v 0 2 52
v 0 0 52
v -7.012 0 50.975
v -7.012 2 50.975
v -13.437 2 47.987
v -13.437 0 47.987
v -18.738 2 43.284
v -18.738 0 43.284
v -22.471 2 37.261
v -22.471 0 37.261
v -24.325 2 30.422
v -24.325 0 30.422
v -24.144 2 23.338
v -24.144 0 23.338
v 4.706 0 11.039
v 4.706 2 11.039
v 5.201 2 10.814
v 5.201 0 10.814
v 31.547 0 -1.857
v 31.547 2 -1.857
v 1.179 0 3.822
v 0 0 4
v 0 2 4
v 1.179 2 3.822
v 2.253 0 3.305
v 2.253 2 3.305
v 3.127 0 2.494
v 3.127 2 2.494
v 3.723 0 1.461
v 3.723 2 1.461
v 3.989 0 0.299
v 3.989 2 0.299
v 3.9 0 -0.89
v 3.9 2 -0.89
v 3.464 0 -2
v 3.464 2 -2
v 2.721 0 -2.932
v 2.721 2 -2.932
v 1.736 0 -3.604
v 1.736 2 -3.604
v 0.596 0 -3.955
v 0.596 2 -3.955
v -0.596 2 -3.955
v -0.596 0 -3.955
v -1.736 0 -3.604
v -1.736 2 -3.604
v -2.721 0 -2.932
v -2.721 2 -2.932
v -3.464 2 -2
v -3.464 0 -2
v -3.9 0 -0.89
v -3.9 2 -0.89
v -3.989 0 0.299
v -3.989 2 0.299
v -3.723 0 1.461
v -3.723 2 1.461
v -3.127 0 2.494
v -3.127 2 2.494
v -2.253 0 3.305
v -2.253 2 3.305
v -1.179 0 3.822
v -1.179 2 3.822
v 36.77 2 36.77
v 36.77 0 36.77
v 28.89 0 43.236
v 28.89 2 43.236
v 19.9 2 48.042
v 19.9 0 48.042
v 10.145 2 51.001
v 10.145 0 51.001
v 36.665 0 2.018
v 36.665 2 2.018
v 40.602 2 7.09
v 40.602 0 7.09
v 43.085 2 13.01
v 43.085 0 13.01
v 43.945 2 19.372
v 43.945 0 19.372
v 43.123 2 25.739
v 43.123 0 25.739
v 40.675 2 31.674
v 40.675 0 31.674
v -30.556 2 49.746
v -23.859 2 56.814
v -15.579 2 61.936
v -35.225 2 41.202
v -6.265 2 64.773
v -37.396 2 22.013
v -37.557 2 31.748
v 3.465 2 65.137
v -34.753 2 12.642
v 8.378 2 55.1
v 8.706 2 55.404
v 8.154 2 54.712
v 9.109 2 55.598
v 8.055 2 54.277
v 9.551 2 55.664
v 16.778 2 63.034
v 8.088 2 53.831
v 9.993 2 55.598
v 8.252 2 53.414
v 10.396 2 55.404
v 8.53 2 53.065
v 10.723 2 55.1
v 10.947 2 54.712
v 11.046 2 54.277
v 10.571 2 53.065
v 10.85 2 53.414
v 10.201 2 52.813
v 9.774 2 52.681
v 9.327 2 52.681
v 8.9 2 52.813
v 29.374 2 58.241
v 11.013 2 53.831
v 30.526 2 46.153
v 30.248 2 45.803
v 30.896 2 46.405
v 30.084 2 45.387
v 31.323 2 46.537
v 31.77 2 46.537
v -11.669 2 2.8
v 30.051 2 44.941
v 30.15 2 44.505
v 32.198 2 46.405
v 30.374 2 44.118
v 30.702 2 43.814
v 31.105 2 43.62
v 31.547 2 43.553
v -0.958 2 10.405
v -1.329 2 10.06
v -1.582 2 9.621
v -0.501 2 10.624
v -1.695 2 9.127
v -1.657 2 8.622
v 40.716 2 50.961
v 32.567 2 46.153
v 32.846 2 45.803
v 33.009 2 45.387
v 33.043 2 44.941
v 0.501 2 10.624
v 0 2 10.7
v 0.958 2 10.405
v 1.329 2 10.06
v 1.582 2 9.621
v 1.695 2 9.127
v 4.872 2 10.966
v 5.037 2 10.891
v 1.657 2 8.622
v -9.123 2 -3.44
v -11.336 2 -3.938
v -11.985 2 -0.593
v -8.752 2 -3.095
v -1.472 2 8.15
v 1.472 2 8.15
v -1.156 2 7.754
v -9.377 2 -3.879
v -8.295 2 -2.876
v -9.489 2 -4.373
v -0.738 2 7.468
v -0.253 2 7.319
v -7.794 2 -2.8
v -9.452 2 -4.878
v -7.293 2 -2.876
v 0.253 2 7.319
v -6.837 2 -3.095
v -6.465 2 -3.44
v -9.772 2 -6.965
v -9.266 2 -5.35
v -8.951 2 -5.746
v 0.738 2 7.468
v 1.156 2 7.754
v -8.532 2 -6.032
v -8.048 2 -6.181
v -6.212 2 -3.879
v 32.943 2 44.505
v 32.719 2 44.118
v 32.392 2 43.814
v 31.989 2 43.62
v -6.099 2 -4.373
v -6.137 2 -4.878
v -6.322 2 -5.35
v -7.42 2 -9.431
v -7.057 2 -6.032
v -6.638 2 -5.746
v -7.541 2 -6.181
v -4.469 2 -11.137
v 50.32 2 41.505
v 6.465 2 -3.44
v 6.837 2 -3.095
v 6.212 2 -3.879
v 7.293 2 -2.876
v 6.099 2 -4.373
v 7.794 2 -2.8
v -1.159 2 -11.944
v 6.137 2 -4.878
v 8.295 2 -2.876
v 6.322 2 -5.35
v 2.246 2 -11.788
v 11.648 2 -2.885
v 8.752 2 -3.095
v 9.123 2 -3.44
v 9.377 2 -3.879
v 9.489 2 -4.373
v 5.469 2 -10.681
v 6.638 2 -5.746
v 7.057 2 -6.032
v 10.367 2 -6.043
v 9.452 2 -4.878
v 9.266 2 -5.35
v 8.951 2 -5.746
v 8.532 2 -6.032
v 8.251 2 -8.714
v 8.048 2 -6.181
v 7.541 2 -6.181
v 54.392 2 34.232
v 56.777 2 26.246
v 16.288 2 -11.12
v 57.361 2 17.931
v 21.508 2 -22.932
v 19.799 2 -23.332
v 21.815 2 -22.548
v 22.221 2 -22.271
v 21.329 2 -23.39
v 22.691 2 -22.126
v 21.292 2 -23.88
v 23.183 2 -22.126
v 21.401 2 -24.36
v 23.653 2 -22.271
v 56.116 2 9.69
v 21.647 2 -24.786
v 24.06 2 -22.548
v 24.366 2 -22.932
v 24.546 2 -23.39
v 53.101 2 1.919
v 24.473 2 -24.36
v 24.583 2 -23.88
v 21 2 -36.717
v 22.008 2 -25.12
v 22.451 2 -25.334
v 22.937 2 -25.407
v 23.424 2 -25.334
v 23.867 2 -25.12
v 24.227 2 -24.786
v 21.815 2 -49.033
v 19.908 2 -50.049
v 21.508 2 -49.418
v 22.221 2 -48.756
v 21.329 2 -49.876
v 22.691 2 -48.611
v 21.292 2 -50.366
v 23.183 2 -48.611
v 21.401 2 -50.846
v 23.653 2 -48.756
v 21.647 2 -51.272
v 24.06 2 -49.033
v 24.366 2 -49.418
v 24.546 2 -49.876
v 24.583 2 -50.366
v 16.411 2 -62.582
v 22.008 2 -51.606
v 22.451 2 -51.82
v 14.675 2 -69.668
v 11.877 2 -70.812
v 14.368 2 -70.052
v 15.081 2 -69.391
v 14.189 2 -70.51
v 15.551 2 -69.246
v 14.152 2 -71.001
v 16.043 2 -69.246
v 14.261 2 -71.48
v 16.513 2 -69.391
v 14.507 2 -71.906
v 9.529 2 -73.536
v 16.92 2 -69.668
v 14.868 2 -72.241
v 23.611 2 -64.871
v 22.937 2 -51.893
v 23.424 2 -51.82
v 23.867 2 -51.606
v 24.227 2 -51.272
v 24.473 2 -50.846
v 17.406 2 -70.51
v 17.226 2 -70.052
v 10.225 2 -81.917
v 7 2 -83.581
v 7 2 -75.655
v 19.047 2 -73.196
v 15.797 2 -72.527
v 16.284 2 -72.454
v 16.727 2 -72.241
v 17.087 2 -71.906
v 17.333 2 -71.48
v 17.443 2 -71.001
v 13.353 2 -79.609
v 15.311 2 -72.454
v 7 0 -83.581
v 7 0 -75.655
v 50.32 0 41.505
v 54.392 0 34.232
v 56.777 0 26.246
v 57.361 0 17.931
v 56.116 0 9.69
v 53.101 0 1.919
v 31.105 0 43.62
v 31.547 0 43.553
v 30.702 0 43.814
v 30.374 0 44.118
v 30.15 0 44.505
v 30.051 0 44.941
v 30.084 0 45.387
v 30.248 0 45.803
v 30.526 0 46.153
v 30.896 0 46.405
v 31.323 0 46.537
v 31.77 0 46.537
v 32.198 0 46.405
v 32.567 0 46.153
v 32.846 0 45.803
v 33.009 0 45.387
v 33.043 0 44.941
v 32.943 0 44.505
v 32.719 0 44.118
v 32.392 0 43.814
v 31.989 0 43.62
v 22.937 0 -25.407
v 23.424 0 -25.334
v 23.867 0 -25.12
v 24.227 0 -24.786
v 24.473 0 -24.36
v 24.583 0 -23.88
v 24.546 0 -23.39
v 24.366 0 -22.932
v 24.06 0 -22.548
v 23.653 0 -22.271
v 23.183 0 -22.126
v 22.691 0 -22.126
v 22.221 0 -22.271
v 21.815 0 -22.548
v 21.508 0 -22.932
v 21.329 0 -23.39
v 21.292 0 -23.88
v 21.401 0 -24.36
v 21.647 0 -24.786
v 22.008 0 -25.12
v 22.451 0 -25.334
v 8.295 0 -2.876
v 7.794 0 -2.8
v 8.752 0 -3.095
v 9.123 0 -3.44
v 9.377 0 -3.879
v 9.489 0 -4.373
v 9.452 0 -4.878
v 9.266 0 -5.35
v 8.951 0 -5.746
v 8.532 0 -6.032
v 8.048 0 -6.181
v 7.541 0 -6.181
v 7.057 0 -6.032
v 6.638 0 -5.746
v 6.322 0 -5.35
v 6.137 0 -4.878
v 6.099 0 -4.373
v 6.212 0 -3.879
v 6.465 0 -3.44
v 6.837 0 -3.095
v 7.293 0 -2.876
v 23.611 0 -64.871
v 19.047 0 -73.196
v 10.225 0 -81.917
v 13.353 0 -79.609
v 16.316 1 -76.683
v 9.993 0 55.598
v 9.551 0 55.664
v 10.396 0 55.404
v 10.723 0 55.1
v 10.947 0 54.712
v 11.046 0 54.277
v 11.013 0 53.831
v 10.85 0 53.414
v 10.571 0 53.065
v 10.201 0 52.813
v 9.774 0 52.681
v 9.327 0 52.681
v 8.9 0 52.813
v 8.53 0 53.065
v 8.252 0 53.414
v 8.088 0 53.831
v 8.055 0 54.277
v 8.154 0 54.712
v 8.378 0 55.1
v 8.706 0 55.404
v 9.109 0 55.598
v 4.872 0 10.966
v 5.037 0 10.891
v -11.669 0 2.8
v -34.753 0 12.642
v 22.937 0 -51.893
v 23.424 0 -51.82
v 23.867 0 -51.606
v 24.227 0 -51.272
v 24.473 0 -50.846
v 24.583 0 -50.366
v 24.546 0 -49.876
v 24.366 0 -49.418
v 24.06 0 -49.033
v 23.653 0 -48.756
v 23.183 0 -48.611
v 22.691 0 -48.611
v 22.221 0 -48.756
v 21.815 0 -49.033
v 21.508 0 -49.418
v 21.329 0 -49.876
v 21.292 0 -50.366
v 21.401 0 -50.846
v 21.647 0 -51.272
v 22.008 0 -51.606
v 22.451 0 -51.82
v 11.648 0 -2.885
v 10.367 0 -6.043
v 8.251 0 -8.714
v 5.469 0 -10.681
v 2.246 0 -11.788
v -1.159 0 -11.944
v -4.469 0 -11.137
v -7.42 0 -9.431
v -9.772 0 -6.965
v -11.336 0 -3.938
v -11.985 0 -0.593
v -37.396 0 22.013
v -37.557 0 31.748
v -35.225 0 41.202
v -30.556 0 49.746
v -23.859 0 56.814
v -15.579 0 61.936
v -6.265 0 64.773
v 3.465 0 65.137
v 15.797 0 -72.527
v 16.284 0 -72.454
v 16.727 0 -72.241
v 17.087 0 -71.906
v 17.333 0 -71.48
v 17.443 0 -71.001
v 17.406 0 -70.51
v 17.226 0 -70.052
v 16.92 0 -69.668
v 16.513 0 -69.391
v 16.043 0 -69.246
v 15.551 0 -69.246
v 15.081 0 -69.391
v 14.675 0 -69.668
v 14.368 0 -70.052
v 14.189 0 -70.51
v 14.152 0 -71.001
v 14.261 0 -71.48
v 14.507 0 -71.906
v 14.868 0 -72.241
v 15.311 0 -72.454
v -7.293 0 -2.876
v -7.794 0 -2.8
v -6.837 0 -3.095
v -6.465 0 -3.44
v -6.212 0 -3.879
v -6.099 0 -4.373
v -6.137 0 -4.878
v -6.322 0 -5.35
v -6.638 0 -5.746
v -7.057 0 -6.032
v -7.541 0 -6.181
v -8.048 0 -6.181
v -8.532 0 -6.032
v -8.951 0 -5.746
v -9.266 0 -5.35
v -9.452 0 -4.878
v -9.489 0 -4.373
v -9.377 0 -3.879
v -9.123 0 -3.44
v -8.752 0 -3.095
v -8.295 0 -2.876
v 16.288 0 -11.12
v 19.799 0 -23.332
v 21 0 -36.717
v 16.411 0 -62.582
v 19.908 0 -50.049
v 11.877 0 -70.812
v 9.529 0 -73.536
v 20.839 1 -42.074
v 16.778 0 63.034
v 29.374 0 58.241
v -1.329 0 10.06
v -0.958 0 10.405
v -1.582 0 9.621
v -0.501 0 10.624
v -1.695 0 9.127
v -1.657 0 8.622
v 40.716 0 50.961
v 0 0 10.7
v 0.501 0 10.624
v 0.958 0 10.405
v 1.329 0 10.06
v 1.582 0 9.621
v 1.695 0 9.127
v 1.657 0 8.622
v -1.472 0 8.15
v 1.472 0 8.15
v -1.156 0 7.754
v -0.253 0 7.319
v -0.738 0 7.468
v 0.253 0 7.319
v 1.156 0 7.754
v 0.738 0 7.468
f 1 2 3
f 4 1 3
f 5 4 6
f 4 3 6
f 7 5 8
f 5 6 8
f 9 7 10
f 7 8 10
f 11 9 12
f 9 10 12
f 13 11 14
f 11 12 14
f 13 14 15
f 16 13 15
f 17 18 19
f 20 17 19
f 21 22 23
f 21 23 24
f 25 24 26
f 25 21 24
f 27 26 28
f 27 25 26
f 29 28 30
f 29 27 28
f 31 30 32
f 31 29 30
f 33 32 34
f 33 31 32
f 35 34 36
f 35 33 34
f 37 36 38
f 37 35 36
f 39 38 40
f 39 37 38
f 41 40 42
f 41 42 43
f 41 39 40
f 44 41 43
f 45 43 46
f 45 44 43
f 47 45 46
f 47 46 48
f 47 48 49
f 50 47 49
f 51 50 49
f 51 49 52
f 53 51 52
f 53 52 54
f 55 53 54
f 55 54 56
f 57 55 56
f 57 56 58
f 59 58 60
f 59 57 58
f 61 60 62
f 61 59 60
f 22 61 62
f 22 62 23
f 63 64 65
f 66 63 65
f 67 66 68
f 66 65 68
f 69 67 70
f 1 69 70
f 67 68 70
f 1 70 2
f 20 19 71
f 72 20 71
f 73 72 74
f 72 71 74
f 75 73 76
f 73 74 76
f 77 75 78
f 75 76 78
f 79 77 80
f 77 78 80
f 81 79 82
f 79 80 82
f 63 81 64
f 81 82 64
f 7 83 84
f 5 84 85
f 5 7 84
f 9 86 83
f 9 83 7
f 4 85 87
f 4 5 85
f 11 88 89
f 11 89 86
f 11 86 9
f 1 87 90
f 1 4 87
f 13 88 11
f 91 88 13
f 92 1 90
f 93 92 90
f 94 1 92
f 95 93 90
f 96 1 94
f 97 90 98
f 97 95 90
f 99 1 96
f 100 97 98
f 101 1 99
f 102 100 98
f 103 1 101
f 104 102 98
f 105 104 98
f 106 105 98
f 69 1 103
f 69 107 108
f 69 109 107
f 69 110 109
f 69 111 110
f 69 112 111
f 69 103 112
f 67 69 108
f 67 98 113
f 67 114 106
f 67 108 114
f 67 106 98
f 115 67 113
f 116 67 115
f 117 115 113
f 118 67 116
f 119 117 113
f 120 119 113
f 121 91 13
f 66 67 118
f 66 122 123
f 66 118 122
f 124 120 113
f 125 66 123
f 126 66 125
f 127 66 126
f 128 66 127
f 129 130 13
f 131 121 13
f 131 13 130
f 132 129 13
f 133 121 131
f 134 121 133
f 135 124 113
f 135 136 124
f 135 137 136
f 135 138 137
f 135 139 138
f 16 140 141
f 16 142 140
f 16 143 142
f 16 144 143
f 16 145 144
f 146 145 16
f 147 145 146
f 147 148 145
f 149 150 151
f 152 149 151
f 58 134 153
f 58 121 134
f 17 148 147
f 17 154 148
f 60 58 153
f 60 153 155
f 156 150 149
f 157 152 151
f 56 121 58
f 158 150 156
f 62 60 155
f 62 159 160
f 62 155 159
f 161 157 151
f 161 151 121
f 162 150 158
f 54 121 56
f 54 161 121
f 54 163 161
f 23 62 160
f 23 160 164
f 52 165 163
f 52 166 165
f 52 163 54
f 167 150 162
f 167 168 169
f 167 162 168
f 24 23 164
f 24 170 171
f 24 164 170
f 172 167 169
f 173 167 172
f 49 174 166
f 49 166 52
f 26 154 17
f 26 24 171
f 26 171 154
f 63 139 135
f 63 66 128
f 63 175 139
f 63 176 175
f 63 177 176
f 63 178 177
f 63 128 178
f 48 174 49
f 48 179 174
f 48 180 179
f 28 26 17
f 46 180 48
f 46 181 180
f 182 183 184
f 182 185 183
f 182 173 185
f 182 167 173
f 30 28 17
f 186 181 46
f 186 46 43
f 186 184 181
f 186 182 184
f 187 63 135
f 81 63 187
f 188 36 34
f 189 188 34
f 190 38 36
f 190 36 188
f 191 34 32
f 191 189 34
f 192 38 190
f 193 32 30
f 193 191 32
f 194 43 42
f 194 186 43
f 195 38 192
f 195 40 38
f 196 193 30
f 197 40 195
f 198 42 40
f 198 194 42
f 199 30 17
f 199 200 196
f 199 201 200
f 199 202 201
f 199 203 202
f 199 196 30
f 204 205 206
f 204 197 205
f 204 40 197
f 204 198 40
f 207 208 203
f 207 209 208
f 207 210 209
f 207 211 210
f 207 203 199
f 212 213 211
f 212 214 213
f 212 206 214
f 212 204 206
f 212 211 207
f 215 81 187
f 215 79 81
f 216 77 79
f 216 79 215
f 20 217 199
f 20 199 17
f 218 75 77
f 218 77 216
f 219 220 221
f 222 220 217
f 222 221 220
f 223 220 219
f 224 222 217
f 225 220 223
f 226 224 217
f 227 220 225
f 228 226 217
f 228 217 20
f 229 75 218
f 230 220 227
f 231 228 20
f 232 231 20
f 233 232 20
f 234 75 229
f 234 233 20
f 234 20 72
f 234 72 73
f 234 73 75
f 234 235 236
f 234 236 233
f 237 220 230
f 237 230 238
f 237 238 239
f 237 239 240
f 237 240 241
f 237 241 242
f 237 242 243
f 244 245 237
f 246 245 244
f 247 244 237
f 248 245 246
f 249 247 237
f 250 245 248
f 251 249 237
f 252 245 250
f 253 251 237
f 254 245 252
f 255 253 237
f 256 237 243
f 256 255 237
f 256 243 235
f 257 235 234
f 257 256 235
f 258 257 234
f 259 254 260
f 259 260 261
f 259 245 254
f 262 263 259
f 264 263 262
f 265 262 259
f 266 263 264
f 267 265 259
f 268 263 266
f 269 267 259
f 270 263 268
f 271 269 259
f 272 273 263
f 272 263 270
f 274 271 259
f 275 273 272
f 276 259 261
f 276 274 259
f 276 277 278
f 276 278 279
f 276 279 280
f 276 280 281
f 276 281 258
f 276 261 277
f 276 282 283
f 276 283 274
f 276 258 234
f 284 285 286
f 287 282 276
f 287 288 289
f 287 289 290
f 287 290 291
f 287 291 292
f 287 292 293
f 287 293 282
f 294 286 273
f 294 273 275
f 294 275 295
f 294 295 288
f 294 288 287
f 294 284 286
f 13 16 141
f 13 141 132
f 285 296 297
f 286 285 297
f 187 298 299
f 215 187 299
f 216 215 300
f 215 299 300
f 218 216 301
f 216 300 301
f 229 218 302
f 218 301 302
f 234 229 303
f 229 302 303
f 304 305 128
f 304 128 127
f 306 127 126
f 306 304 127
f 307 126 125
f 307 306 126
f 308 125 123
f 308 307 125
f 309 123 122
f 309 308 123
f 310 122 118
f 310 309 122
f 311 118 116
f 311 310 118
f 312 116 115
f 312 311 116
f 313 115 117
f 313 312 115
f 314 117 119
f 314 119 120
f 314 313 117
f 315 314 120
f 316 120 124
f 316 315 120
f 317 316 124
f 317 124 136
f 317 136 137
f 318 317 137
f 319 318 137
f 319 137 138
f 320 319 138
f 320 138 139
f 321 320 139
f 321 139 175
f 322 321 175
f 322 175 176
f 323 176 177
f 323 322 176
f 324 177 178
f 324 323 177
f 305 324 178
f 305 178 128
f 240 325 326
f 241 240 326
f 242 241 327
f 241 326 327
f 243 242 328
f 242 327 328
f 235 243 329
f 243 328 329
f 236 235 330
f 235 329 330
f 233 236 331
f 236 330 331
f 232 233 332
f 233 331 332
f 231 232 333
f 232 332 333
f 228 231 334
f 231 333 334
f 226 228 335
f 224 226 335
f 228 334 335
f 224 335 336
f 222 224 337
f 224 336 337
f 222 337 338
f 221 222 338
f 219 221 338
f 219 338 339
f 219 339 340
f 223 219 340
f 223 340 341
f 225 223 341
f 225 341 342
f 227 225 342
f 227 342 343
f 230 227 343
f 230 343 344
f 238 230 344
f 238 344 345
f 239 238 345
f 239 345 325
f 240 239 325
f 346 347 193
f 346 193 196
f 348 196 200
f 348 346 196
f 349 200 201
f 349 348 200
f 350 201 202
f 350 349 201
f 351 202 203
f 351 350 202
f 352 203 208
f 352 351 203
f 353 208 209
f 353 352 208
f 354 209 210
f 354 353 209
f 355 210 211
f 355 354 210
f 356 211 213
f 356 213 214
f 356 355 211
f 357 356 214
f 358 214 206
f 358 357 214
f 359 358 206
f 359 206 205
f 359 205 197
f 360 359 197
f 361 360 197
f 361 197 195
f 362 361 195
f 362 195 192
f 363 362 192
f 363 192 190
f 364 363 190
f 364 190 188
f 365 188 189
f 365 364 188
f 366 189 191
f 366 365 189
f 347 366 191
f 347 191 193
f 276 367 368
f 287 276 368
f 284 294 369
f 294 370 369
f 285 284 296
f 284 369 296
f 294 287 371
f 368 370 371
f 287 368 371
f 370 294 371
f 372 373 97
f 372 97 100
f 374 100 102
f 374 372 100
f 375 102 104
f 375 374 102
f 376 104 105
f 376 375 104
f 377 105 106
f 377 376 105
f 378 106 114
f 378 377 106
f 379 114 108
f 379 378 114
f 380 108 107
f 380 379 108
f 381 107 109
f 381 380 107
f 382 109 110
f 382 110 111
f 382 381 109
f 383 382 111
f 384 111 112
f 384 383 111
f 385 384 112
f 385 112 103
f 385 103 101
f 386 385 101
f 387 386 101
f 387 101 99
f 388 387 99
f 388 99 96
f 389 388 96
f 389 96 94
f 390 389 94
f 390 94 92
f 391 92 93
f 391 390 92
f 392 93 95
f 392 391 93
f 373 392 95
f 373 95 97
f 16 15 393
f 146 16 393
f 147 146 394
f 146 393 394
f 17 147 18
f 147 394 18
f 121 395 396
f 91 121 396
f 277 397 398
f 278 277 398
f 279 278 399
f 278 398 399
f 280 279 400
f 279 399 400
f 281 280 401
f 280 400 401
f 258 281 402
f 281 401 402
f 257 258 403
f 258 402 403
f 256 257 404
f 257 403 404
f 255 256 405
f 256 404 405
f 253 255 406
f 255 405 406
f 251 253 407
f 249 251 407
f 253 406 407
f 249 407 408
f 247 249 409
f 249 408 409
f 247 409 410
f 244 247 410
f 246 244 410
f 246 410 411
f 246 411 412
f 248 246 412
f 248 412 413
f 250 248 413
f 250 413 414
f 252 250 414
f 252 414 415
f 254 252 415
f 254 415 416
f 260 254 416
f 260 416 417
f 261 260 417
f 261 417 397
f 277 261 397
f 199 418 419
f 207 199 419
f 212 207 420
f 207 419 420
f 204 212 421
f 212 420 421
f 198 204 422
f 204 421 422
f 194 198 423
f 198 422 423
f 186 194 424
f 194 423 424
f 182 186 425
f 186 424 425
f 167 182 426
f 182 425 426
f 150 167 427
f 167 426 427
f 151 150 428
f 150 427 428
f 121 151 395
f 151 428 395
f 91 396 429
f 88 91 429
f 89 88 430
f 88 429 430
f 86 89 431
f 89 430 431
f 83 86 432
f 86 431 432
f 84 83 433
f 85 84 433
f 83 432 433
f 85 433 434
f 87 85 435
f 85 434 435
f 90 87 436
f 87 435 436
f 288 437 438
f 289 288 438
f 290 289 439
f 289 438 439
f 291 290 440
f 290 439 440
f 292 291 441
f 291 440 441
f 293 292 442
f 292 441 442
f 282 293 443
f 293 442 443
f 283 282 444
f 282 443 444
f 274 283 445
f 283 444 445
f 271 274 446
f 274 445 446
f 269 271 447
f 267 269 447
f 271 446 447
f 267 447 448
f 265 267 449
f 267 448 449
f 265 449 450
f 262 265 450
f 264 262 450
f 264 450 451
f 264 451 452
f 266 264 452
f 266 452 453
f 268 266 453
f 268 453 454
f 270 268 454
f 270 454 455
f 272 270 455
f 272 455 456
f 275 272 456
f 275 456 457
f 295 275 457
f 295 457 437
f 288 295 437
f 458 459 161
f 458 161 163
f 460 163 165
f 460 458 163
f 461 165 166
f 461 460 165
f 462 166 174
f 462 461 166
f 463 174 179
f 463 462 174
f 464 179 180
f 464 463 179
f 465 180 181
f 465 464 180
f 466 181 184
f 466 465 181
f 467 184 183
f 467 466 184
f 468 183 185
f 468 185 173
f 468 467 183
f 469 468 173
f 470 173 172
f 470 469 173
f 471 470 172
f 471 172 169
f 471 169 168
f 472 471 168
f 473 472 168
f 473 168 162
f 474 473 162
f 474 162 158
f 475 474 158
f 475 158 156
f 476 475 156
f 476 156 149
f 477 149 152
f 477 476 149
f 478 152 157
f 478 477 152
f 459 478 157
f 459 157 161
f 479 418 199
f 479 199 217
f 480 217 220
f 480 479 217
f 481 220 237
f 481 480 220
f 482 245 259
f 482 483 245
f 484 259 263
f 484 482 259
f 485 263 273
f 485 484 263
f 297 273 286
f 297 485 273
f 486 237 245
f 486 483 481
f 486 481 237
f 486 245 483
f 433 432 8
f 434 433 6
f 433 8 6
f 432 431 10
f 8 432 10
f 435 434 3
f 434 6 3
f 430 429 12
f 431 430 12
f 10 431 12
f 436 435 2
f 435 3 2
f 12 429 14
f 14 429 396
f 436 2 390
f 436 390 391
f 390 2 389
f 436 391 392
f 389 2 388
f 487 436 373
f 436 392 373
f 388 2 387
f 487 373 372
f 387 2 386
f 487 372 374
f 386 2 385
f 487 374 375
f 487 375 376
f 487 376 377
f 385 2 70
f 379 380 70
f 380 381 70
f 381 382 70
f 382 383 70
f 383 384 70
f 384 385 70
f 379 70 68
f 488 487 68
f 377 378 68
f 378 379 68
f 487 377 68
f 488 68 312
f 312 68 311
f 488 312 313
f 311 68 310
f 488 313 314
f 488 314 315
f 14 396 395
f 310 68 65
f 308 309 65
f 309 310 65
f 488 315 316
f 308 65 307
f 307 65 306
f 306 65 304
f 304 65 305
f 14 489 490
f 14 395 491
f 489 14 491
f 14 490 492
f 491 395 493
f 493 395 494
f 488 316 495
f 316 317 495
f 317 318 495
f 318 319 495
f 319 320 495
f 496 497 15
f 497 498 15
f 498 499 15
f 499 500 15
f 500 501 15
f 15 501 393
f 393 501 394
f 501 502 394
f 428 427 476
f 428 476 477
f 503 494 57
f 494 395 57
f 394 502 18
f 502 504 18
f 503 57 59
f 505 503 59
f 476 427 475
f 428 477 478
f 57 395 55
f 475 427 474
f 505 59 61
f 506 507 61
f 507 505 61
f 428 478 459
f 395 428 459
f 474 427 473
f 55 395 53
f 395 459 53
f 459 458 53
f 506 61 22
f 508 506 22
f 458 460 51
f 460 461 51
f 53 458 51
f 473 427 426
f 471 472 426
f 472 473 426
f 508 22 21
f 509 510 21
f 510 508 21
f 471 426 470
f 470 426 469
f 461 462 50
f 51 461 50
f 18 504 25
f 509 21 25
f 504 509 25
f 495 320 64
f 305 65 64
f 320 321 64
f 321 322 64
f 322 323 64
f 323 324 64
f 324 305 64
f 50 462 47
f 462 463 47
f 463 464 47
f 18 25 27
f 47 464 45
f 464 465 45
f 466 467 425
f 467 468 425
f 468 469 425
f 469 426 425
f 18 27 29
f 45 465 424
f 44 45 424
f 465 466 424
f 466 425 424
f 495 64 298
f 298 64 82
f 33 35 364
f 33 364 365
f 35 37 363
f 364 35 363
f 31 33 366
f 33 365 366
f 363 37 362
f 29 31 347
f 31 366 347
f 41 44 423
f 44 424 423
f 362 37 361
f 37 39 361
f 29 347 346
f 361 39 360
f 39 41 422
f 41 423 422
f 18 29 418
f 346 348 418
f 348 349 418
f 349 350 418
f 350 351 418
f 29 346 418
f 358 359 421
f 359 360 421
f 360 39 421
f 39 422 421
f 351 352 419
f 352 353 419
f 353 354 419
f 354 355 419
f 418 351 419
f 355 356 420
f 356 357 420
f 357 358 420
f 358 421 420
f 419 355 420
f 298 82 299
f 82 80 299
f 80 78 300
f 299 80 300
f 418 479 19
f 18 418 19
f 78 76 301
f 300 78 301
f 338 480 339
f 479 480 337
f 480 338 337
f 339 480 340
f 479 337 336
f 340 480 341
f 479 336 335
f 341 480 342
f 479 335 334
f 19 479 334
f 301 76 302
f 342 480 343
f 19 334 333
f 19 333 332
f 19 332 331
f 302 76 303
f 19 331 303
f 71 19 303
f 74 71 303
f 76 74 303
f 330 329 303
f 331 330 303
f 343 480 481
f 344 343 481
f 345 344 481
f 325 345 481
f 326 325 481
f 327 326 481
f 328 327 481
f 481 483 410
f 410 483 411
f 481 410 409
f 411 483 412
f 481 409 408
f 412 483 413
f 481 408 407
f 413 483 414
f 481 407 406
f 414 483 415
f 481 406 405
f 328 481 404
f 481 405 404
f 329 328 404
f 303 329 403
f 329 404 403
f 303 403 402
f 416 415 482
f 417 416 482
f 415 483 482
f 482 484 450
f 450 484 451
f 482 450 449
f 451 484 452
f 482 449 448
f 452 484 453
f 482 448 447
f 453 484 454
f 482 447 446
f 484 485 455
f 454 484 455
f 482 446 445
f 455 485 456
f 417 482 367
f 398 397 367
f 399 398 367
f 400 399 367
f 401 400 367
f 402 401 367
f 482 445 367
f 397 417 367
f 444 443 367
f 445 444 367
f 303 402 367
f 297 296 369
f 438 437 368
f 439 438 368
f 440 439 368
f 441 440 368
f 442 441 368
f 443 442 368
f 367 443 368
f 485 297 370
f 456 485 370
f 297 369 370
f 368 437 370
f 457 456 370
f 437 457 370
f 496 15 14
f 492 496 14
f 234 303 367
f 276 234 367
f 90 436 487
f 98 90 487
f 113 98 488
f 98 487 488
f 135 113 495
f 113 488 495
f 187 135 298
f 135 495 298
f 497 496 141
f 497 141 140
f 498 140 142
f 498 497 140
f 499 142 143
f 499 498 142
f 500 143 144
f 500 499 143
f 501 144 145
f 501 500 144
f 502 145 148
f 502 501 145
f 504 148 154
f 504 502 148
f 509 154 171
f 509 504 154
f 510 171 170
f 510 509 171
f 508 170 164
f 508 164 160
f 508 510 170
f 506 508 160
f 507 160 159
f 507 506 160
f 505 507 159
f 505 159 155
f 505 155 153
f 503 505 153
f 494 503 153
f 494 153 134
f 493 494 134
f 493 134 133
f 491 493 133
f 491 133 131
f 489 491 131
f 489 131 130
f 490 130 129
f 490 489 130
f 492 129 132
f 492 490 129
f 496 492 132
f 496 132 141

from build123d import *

# Parameters (mm, degrees)
SKETCH_1_R          = 1.5
SKETCH_1_R_2        = 4
SKETCH_1_R_3        = 1.7
EXTRUDE_1_DEPTH     = 2
SKETCH_2_R          = 1.65
CUT_EXTRUDE_1_DEPTH = 102.407591669


with BuildPart() as part:
    # Эскиз1 → Бобышка-Вытянуть1 (new body)
    with BuildSketch(Plane(origin=(0, 0, 0), x_dir=(1, 0, 0), z_dir=(0, 1, 0))):
        with BuildLine():
            Line((53.10140272, -1.919174262), (23.610564566, 64.870923375))
            add(Edge.make_bspline(
                [(23.610564566, 64.870923375), (17.392407438, 79.302147967), (7, 83.580680649)],
                knots=[2.190316087, 2.190316087, 2.190316087, 2.897805715, 2.897805715, 2.897805715], degree=2, weights=[1, 0.938082041, 1]))
            Line((7, 83.580680649), (7, 75.655170705))
            add(Edge.make_bspline(
                [(11.648024248, 2.885053055), (46.572977066, 48.339095994), (7, 75.655170705)],
                knots=[3.729556348, 3.729556348, 3.729556348, 5.943348398, 5.943348398, 5.943348398], degree=2, weights=[1, 0.447439597, 1]))
            ThreePointArc((11.648024248, 2.885053055), (-2.842752582, 11.658420037), (-11.66866221, -2.800414652))
            Line((-11.66866221, -2.800414652), (-34.753025964, -12.641731973))
            ThreePointArc((-34.753025964, -12.641731973), (-30.555954815, -49.745776402), (3.465216083, -65.136859857))
            ThreePointArc((3.465216083, -65.136859857), (29.374152775, -58.240684948), (50.320473487, -41.505038039))
            ThreePointArc((50.320473487, -41.505038039), (57.298081669, -22.104606133), (53.10140272, -1.919174262))
        make_face()
        with Locations(Location((9.550649772, -54.164426416, 0), (0, 0, 270))):
            Circle(SKETCH_1_R, mode=Mode.SUBTRACT)
        with Locations(Location((31.546703999, -45.053362436, 0), (0, 0, 90))):
            Circle(SKETCH_1_R, mode=Mode.SUBTRACT)
        with Locations(Location((0, 0, 0), (0, 0, 270))):
            Circle(SKETCH_1_R_2, mode=Mode.SUBTRACT)
        with Locations(Location((0, -9, 0), (0, 0, 270))):
            Circle(SKETCH_1_R_3, mode=Mode.SUBTRACT)
        with Locations(Location((-7.794228634, 4.5, 0), (0, 0, 270))):
            Circle(SKETCH_1_R_3, mode=Mode.SUBTRACT)
        with Locations(Location((7.794228634, 4.5, 0), (0, 0, 270))):
            Circle(SKETCH_1_R_3, mode=Mode.SUBTRACT)
        with BuildLine():
            Line((5.20136166, -10.814149845), (31.546703999, 1.857364378))
            ThreePointArc((31.546703999, 1.857364378), (43.724501128, -16.162599301), (36.769552622, -36.769552622))
            ThreePointArc((36.769552622, -36.769552622), (19.899538483, -48.041735691), (0, -52))
            ThreePointArc((0, -52), (-18.737913487, -43.284188232), (-24.14389825, -23.338008012))
            Line((-24.14389825, -23.338008012), (4.70602312, -11.038720324))
            ThreePointArc((4.70602312, -11.038720324), (4.95496481, -10.929241681), (5.20136166, -10.814149845))
        make_face(mode=Mode.SUBTRACT)
    extrude(amount=EXTRUDE_1_DEPTH)

    # Эскиз2 → Вырез-Вытянуть1 (cut, through all)
    with BuildSketch(Plane.XZ):
        with Locations(Location((22.937226804, -23.75718593, 0), (0, 0, 270))):
            Circle(SKETCH_2_R)
        with Locations(Location((15.797221102, -70.877249978, 0), (0, 0, 270))):
            Circle(SKETCH_2_R)
        with Locations(Location((22.937226804, -50.24281407, 0), (0, 0, 270))):
            Circle(SKETCH_2_R)
    extrude(amount=-CUT_EXTRUDE_1_DEPTH, mode=Mode.SUBTRACT)


solid = part.part
